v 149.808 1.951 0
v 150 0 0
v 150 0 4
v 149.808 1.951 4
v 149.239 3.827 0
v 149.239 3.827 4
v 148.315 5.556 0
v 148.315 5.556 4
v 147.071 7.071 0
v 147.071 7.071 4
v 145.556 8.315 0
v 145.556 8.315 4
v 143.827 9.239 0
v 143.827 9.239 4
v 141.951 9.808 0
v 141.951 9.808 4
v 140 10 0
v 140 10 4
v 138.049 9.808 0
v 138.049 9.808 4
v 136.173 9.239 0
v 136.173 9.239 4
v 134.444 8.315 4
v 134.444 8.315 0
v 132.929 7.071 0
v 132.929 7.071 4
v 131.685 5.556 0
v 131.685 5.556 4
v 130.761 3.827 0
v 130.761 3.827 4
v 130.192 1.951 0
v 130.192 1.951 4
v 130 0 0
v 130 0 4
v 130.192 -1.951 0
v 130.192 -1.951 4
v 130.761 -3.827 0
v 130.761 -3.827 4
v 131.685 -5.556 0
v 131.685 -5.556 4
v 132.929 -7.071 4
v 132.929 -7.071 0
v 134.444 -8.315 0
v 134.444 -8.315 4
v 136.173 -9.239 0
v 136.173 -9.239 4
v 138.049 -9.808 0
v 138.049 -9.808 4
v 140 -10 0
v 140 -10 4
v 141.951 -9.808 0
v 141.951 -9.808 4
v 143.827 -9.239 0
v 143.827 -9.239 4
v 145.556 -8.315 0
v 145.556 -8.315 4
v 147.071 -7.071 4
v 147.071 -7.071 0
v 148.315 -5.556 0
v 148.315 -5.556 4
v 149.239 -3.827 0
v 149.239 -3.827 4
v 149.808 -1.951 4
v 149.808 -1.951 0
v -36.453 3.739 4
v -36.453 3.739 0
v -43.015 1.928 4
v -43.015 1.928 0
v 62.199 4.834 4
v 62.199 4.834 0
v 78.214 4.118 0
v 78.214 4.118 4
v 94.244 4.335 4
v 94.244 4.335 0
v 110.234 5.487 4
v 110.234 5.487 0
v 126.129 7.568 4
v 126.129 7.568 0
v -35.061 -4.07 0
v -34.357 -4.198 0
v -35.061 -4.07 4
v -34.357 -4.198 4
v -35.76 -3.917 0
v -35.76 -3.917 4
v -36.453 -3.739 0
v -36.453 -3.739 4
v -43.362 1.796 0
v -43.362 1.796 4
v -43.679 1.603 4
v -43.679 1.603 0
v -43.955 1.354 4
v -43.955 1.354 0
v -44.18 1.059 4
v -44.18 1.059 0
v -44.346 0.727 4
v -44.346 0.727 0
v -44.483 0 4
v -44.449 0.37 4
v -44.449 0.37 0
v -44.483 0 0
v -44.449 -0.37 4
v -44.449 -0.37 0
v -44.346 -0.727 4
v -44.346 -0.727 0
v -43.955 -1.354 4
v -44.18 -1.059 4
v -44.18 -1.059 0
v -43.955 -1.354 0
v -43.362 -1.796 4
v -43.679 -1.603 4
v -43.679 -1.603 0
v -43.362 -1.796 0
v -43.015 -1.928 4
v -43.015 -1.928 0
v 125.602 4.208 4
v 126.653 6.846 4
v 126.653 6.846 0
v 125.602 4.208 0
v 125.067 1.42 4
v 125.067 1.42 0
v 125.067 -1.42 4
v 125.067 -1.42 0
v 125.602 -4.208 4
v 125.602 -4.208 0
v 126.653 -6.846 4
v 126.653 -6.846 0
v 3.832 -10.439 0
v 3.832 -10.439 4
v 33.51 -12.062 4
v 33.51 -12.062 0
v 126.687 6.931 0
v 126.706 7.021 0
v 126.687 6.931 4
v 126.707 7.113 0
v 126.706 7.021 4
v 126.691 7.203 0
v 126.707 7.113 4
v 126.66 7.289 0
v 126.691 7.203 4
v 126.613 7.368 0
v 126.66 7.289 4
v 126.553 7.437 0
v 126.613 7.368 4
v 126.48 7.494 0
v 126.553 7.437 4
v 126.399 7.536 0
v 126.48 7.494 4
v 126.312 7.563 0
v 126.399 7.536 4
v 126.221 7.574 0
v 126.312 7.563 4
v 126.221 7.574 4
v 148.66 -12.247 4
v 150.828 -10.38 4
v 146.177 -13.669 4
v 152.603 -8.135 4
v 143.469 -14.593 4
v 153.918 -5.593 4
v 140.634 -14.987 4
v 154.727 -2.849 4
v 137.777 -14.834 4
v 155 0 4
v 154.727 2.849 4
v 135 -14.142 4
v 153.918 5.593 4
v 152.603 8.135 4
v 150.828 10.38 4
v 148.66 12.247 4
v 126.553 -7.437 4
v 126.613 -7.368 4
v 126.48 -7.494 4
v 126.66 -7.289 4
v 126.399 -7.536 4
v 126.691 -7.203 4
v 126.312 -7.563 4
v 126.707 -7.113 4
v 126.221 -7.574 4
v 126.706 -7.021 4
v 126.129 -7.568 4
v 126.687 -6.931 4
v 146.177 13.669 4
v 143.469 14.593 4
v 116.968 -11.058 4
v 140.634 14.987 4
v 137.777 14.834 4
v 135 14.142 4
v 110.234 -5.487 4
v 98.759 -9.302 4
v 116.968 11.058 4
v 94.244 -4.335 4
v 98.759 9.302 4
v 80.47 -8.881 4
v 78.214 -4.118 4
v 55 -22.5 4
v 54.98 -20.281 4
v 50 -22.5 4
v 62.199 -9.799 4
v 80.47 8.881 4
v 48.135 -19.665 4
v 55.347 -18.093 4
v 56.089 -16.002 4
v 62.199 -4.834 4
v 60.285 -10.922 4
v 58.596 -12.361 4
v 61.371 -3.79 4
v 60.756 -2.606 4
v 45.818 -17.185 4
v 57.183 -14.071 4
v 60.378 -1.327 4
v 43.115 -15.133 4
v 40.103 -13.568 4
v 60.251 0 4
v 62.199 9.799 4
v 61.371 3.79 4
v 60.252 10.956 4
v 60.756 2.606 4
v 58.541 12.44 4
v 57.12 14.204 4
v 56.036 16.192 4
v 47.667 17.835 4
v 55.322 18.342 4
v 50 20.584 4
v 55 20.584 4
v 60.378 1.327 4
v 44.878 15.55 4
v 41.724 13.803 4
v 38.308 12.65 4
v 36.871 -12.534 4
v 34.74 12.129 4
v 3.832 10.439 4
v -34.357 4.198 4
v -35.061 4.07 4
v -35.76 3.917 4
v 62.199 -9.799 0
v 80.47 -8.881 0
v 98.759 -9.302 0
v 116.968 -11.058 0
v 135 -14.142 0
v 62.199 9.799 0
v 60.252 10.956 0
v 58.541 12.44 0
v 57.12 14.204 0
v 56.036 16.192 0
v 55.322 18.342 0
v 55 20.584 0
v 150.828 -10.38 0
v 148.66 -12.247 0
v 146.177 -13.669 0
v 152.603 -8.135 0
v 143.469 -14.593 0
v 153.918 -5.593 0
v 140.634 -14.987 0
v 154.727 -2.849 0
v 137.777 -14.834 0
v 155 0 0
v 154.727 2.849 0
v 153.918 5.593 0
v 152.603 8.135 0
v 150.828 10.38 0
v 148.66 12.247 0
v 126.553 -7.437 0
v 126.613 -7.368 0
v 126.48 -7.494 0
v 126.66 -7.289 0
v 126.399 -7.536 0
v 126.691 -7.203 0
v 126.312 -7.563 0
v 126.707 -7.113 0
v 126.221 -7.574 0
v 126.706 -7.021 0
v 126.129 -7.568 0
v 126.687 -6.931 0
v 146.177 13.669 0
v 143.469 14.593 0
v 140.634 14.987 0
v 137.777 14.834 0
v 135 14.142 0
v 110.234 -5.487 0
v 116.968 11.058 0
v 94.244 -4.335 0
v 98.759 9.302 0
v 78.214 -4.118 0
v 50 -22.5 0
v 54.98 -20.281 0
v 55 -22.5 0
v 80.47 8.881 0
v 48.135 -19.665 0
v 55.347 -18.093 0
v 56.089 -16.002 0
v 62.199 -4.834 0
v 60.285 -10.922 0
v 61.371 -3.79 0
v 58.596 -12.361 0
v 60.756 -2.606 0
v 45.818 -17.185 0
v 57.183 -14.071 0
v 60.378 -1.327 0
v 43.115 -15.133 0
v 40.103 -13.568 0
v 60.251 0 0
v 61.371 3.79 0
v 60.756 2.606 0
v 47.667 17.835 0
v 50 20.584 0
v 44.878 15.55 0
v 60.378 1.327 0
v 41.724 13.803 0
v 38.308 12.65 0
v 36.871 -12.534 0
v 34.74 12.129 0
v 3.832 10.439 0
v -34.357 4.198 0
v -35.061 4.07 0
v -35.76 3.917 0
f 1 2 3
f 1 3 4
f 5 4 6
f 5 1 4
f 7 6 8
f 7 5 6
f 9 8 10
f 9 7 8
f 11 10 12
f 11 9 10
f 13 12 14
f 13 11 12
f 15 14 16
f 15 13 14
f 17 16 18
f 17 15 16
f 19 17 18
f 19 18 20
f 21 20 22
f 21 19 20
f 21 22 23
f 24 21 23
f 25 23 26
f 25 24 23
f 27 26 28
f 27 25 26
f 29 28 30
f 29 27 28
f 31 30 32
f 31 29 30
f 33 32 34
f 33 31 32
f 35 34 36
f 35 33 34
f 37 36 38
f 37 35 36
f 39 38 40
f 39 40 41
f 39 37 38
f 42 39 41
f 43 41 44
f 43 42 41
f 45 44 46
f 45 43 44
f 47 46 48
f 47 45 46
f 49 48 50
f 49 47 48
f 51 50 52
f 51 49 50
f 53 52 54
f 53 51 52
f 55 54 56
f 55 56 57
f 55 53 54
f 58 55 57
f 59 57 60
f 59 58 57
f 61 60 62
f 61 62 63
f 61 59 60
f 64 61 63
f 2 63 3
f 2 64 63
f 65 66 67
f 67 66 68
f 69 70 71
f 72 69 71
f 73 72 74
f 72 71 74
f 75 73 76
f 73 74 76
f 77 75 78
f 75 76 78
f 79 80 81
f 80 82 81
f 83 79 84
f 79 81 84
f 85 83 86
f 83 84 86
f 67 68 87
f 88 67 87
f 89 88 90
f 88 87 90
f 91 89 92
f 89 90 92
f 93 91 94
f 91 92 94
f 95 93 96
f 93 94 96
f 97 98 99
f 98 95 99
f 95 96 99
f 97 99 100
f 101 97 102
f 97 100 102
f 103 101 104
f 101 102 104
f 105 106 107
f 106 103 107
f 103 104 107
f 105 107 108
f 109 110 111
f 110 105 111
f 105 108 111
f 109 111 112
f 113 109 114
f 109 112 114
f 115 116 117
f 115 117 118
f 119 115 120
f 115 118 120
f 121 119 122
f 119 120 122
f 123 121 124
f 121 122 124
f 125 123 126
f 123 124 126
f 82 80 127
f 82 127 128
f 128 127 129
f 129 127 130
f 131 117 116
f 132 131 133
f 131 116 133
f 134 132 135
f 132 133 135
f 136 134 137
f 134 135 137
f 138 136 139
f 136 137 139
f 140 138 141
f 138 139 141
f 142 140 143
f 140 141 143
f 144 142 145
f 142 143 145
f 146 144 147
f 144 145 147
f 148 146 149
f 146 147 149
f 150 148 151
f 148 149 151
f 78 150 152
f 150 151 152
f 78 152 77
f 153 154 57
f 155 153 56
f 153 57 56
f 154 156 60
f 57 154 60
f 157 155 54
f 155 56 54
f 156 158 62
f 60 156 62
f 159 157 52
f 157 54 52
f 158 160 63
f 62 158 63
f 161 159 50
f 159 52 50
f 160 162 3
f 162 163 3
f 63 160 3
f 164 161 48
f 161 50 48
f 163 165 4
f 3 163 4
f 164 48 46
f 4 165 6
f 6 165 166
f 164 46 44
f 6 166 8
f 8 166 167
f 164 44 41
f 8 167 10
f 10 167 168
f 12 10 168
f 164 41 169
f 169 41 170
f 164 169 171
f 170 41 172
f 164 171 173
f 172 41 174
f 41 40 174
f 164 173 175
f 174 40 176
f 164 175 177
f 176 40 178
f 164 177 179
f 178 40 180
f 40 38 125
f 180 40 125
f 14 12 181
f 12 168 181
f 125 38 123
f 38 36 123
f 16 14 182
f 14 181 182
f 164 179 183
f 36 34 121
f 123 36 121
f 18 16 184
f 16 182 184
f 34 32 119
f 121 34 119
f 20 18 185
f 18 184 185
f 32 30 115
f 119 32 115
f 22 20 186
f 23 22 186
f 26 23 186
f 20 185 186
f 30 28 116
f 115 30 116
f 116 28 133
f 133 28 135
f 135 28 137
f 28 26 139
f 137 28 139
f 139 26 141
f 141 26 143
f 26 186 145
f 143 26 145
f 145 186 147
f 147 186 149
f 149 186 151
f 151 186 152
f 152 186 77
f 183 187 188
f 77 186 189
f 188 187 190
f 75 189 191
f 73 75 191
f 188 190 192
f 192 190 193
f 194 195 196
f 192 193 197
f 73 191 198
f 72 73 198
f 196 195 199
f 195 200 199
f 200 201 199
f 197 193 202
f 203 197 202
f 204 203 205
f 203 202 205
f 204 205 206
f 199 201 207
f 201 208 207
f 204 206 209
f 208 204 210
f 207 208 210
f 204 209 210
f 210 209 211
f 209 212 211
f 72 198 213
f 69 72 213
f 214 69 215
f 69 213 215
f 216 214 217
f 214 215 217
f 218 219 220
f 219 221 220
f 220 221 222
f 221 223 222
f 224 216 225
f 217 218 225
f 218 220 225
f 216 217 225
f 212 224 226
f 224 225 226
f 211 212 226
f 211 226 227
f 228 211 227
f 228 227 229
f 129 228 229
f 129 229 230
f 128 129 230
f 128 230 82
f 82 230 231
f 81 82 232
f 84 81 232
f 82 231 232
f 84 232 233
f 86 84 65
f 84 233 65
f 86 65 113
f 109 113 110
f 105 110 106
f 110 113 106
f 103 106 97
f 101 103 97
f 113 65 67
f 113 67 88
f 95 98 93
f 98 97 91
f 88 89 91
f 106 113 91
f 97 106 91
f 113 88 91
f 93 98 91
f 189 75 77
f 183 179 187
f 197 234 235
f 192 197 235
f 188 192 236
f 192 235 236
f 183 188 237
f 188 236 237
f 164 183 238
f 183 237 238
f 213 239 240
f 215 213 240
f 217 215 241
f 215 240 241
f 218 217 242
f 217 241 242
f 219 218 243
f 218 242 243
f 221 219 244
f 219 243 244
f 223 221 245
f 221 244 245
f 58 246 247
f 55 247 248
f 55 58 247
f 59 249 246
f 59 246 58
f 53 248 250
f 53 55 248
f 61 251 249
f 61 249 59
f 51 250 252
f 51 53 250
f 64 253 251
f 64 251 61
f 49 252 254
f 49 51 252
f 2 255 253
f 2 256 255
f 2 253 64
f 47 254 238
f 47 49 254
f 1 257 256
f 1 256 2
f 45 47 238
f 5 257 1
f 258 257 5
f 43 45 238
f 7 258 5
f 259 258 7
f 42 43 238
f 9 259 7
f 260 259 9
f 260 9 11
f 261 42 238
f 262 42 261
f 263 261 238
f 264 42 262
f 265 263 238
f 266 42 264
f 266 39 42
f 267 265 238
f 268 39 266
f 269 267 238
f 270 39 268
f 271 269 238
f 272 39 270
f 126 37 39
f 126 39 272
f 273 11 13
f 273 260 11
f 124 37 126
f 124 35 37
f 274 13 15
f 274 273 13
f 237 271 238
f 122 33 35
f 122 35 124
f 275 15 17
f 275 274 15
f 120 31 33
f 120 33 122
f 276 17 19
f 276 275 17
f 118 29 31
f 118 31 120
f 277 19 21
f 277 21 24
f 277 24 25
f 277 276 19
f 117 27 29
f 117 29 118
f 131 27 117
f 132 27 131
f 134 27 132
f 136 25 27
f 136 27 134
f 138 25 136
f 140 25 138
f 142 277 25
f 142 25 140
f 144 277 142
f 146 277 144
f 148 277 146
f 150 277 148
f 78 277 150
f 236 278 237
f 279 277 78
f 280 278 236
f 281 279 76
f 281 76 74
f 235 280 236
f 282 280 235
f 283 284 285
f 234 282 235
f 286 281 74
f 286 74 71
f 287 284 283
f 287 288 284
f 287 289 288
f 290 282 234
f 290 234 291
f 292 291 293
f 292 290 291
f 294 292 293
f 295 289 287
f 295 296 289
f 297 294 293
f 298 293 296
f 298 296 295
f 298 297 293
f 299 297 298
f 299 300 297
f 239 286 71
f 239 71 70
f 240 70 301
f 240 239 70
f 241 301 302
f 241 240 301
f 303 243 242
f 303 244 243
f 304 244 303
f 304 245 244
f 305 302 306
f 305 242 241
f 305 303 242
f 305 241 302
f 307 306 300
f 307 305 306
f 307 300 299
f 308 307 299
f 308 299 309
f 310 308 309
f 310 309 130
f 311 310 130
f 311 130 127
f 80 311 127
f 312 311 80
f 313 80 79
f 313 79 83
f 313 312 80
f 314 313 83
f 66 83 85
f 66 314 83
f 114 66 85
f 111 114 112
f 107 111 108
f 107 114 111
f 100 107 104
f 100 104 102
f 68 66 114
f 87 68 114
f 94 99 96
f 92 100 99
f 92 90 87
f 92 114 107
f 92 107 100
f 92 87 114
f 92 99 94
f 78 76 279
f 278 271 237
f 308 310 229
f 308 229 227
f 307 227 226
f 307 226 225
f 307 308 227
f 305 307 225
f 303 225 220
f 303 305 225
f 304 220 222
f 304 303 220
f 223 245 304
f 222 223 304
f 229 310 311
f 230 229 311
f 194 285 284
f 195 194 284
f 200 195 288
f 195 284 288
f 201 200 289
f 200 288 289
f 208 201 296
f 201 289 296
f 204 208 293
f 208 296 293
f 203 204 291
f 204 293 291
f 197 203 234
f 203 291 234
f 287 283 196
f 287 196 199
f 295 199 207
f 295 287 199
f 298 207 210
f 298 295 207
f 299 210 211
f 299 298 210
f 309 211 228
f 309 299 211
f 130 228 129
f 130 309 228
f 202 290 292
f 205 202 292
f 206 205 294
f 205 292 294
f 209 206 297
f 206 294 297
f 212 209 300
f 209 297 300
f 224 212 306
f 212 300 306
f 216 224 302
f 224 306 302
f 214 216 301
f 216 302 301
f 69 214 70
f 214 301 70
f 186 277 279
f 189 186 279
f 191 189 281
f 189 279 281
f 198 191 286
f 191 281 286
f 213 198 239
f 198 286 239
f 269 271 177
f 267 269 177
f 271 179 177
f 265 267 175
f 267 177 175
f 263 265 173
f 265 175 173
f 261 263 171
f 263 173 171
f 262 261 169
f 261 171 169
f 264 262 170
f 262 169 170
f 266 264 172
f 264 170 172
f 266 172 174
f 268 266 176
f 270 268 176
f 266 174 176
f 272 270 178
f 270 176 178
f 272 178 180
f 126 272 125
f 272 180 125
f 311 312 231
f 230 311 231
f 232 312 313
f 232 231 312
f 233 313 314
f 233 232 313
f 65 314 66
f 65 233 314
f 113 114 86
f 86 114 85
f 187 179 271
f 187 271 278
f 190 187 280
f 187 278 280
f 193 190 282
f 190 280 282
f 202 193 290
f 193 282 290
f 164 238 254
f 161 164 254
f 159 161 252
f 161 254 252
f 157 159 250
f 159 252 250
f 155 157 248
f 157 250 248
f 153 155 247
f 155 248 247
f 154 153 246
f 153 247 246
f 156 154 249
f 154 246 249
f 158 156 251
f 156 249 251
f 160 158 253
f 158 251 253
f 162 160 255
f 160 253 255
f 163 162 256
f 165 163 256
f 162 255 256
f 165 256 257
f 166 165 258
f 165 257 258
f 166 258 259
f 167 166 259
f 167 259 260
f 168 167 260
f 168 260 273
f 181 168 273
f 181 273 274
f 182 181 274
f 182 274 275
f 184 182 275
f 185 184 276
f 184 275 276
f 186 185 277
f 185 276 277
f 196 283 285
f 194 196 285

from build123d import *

# Parameters (mm, degrees)
F0_R        = 10
F1_DEPTH    = 4
F2_R        = 0.5
F3_T1_DEPTH = 40.2304088715
F4_T1_DEPTH = 4
F5_SIZE     = 20
F6_R        = 20


# Not quite as in the source:
# - a fillet or chamfer that OpenCascade refuses, or shapes differently, is made with other operations: its cross-section is extruded or revolved along the edge and cut away or added


with BuildPart() as f1:
    # F0 (on Top) → F1 (new body)
    with BuildSketch(Plane.XY):
        with BuildLine():
            Line((50, 20.5837816147), (50, 12.9642039537))
            Line((50, 12.9642039537), (-16.1380209029, 9.3462867662))
            Line((-16.1380209029, 9.3462867662), (-50, 0))
            Line((-50, 0), (-16.1380209029, -9.3462867662))
            Line((-16.1380209029, -9.3462867662), (50, -12.9642039537))
            Line((50, -12.9642039537), (50, -22.5))
            Line((50, -22.5), (55, -22.5))
            ThreePointArc((55, -22.5), (56.5936558821, -15.0125045804), (62.1990375221, -9.7988663689))
            ThreePointArc((62.1990375221, -9.7988663689), (98.7587484272, -9.3015269429), (135, -14.1421356237))
            ThreePointArc((135, -14.1421356237), (155, 0), (135, 14.1421356237))
            ThreePointArc((135, 14.1421356237), (98.7587484272, 9.3015269429), (62.1990375221, 9.7988663689))
            ThreePointArc((62.1990375221, 9.7988663689), (57.1204966078, 14.2040620862), (55, 20.5837816147))
            Line((55, 20.5837816147), (50, 20.5837816147))
        make_face()
        with BuildLine():
            ThreePointArc((62.1990375221, -4.8343795659), (60.2509894701, 0), (62.1990375221, 4.8343795659))
            ThreePointArc((62.1990375221, 4.8343795659), (94.7590329876, 4.3577585856), (127.1470964452, 7.7332315503))
            ThreePointArc((127.1470964452, 7.7332315503), (125, 0), (127.1470964452, -7.7332315503))
            ThreePointArc((127.1470964452, -7.7332315503), (94.7590329876, -4.3577585856), (62.1990375221, -4.8343795659))
        make_face(mode=Mode.SUBTRACT)
        with Locations((140, 0)):
            Circle(F0_R, mode=Mode.SUBTRACT)
    extrude(amount=F1_DEPTH)

    # F2
    f2_edges = [f1.edges().sort_by_distance(p)[0] for p in [
        (127.147096, 7.733232, 2),
        (127.147096, -7.733232, 2),
    ]]
    fillet(f2_edges, radius=F2_R)

    # F3: fillet of radius 2 on 1 edges, made by hand

    # F3_s2 → F3_t1 (cut)
    with BuildSketch(Plane.XY.offset(-18.1152044358)):
        with BuildLine():
            ThreePointArc((-43.0150978282, 1.9279114946), (-44.4829725902, 0), (-43.0150978282, -1.9279114946))
            Line((-43.0150978282, -1.9279114946), (-50, 0))
            Line((-50, 0), (-43.0150978282, 1.9279114946))
        make_face()
    extrude(amount=F3_T1_DEPTH, mode=Mode.SUBTRACT)

    # F4: fillet of radius 20 on 2 edges, made by hand

    # F4_s2 → F4_t1 (join)
    with BuildSketch(Plane.XY):
        with BuildLine():
            ThreePointArc((34.7404872131, 12.1294699712), (43.3406010629, 14.6051902372), (50, 20.5837816147))
            Line((50, 20.5837816147), (50, 12.9642039537))
            Line((50, 12.9642039537), (34.7404872131, 12.1294699712))
        make_face()
        with BuildLine():
            ThreePointArc((50, -22.5), (43.1146209861, -15.1332813357), (33.5101814977, -12.0621691338))
            Line((33.5101814977, -12.0621691338), (50, -12.9642039537))
            Line((50, -12.9642039537), (50, -22.5))
        make_face()
    extrude(amount=F4_T1_DEPTH)

    # F5
    f5_edges = [f1.edges().sort_by_distance(p)[0] for p in [
        (-16.138021, -9.346287, 2),
        (-16.138021, 9.346287, 2),
    ]]
    chamfer(f5_edges, length=F5_SIZE)

    # F6
    f6_edges = [f1.edges().sort_by_distance(p)[0] for p in [
        (-35.417136, 4.025034, 2),
        (-35.417136, -4.025034, 2),
    ]]
    fillet(f6_edges, radius=F6_R)


solid = f1.part
